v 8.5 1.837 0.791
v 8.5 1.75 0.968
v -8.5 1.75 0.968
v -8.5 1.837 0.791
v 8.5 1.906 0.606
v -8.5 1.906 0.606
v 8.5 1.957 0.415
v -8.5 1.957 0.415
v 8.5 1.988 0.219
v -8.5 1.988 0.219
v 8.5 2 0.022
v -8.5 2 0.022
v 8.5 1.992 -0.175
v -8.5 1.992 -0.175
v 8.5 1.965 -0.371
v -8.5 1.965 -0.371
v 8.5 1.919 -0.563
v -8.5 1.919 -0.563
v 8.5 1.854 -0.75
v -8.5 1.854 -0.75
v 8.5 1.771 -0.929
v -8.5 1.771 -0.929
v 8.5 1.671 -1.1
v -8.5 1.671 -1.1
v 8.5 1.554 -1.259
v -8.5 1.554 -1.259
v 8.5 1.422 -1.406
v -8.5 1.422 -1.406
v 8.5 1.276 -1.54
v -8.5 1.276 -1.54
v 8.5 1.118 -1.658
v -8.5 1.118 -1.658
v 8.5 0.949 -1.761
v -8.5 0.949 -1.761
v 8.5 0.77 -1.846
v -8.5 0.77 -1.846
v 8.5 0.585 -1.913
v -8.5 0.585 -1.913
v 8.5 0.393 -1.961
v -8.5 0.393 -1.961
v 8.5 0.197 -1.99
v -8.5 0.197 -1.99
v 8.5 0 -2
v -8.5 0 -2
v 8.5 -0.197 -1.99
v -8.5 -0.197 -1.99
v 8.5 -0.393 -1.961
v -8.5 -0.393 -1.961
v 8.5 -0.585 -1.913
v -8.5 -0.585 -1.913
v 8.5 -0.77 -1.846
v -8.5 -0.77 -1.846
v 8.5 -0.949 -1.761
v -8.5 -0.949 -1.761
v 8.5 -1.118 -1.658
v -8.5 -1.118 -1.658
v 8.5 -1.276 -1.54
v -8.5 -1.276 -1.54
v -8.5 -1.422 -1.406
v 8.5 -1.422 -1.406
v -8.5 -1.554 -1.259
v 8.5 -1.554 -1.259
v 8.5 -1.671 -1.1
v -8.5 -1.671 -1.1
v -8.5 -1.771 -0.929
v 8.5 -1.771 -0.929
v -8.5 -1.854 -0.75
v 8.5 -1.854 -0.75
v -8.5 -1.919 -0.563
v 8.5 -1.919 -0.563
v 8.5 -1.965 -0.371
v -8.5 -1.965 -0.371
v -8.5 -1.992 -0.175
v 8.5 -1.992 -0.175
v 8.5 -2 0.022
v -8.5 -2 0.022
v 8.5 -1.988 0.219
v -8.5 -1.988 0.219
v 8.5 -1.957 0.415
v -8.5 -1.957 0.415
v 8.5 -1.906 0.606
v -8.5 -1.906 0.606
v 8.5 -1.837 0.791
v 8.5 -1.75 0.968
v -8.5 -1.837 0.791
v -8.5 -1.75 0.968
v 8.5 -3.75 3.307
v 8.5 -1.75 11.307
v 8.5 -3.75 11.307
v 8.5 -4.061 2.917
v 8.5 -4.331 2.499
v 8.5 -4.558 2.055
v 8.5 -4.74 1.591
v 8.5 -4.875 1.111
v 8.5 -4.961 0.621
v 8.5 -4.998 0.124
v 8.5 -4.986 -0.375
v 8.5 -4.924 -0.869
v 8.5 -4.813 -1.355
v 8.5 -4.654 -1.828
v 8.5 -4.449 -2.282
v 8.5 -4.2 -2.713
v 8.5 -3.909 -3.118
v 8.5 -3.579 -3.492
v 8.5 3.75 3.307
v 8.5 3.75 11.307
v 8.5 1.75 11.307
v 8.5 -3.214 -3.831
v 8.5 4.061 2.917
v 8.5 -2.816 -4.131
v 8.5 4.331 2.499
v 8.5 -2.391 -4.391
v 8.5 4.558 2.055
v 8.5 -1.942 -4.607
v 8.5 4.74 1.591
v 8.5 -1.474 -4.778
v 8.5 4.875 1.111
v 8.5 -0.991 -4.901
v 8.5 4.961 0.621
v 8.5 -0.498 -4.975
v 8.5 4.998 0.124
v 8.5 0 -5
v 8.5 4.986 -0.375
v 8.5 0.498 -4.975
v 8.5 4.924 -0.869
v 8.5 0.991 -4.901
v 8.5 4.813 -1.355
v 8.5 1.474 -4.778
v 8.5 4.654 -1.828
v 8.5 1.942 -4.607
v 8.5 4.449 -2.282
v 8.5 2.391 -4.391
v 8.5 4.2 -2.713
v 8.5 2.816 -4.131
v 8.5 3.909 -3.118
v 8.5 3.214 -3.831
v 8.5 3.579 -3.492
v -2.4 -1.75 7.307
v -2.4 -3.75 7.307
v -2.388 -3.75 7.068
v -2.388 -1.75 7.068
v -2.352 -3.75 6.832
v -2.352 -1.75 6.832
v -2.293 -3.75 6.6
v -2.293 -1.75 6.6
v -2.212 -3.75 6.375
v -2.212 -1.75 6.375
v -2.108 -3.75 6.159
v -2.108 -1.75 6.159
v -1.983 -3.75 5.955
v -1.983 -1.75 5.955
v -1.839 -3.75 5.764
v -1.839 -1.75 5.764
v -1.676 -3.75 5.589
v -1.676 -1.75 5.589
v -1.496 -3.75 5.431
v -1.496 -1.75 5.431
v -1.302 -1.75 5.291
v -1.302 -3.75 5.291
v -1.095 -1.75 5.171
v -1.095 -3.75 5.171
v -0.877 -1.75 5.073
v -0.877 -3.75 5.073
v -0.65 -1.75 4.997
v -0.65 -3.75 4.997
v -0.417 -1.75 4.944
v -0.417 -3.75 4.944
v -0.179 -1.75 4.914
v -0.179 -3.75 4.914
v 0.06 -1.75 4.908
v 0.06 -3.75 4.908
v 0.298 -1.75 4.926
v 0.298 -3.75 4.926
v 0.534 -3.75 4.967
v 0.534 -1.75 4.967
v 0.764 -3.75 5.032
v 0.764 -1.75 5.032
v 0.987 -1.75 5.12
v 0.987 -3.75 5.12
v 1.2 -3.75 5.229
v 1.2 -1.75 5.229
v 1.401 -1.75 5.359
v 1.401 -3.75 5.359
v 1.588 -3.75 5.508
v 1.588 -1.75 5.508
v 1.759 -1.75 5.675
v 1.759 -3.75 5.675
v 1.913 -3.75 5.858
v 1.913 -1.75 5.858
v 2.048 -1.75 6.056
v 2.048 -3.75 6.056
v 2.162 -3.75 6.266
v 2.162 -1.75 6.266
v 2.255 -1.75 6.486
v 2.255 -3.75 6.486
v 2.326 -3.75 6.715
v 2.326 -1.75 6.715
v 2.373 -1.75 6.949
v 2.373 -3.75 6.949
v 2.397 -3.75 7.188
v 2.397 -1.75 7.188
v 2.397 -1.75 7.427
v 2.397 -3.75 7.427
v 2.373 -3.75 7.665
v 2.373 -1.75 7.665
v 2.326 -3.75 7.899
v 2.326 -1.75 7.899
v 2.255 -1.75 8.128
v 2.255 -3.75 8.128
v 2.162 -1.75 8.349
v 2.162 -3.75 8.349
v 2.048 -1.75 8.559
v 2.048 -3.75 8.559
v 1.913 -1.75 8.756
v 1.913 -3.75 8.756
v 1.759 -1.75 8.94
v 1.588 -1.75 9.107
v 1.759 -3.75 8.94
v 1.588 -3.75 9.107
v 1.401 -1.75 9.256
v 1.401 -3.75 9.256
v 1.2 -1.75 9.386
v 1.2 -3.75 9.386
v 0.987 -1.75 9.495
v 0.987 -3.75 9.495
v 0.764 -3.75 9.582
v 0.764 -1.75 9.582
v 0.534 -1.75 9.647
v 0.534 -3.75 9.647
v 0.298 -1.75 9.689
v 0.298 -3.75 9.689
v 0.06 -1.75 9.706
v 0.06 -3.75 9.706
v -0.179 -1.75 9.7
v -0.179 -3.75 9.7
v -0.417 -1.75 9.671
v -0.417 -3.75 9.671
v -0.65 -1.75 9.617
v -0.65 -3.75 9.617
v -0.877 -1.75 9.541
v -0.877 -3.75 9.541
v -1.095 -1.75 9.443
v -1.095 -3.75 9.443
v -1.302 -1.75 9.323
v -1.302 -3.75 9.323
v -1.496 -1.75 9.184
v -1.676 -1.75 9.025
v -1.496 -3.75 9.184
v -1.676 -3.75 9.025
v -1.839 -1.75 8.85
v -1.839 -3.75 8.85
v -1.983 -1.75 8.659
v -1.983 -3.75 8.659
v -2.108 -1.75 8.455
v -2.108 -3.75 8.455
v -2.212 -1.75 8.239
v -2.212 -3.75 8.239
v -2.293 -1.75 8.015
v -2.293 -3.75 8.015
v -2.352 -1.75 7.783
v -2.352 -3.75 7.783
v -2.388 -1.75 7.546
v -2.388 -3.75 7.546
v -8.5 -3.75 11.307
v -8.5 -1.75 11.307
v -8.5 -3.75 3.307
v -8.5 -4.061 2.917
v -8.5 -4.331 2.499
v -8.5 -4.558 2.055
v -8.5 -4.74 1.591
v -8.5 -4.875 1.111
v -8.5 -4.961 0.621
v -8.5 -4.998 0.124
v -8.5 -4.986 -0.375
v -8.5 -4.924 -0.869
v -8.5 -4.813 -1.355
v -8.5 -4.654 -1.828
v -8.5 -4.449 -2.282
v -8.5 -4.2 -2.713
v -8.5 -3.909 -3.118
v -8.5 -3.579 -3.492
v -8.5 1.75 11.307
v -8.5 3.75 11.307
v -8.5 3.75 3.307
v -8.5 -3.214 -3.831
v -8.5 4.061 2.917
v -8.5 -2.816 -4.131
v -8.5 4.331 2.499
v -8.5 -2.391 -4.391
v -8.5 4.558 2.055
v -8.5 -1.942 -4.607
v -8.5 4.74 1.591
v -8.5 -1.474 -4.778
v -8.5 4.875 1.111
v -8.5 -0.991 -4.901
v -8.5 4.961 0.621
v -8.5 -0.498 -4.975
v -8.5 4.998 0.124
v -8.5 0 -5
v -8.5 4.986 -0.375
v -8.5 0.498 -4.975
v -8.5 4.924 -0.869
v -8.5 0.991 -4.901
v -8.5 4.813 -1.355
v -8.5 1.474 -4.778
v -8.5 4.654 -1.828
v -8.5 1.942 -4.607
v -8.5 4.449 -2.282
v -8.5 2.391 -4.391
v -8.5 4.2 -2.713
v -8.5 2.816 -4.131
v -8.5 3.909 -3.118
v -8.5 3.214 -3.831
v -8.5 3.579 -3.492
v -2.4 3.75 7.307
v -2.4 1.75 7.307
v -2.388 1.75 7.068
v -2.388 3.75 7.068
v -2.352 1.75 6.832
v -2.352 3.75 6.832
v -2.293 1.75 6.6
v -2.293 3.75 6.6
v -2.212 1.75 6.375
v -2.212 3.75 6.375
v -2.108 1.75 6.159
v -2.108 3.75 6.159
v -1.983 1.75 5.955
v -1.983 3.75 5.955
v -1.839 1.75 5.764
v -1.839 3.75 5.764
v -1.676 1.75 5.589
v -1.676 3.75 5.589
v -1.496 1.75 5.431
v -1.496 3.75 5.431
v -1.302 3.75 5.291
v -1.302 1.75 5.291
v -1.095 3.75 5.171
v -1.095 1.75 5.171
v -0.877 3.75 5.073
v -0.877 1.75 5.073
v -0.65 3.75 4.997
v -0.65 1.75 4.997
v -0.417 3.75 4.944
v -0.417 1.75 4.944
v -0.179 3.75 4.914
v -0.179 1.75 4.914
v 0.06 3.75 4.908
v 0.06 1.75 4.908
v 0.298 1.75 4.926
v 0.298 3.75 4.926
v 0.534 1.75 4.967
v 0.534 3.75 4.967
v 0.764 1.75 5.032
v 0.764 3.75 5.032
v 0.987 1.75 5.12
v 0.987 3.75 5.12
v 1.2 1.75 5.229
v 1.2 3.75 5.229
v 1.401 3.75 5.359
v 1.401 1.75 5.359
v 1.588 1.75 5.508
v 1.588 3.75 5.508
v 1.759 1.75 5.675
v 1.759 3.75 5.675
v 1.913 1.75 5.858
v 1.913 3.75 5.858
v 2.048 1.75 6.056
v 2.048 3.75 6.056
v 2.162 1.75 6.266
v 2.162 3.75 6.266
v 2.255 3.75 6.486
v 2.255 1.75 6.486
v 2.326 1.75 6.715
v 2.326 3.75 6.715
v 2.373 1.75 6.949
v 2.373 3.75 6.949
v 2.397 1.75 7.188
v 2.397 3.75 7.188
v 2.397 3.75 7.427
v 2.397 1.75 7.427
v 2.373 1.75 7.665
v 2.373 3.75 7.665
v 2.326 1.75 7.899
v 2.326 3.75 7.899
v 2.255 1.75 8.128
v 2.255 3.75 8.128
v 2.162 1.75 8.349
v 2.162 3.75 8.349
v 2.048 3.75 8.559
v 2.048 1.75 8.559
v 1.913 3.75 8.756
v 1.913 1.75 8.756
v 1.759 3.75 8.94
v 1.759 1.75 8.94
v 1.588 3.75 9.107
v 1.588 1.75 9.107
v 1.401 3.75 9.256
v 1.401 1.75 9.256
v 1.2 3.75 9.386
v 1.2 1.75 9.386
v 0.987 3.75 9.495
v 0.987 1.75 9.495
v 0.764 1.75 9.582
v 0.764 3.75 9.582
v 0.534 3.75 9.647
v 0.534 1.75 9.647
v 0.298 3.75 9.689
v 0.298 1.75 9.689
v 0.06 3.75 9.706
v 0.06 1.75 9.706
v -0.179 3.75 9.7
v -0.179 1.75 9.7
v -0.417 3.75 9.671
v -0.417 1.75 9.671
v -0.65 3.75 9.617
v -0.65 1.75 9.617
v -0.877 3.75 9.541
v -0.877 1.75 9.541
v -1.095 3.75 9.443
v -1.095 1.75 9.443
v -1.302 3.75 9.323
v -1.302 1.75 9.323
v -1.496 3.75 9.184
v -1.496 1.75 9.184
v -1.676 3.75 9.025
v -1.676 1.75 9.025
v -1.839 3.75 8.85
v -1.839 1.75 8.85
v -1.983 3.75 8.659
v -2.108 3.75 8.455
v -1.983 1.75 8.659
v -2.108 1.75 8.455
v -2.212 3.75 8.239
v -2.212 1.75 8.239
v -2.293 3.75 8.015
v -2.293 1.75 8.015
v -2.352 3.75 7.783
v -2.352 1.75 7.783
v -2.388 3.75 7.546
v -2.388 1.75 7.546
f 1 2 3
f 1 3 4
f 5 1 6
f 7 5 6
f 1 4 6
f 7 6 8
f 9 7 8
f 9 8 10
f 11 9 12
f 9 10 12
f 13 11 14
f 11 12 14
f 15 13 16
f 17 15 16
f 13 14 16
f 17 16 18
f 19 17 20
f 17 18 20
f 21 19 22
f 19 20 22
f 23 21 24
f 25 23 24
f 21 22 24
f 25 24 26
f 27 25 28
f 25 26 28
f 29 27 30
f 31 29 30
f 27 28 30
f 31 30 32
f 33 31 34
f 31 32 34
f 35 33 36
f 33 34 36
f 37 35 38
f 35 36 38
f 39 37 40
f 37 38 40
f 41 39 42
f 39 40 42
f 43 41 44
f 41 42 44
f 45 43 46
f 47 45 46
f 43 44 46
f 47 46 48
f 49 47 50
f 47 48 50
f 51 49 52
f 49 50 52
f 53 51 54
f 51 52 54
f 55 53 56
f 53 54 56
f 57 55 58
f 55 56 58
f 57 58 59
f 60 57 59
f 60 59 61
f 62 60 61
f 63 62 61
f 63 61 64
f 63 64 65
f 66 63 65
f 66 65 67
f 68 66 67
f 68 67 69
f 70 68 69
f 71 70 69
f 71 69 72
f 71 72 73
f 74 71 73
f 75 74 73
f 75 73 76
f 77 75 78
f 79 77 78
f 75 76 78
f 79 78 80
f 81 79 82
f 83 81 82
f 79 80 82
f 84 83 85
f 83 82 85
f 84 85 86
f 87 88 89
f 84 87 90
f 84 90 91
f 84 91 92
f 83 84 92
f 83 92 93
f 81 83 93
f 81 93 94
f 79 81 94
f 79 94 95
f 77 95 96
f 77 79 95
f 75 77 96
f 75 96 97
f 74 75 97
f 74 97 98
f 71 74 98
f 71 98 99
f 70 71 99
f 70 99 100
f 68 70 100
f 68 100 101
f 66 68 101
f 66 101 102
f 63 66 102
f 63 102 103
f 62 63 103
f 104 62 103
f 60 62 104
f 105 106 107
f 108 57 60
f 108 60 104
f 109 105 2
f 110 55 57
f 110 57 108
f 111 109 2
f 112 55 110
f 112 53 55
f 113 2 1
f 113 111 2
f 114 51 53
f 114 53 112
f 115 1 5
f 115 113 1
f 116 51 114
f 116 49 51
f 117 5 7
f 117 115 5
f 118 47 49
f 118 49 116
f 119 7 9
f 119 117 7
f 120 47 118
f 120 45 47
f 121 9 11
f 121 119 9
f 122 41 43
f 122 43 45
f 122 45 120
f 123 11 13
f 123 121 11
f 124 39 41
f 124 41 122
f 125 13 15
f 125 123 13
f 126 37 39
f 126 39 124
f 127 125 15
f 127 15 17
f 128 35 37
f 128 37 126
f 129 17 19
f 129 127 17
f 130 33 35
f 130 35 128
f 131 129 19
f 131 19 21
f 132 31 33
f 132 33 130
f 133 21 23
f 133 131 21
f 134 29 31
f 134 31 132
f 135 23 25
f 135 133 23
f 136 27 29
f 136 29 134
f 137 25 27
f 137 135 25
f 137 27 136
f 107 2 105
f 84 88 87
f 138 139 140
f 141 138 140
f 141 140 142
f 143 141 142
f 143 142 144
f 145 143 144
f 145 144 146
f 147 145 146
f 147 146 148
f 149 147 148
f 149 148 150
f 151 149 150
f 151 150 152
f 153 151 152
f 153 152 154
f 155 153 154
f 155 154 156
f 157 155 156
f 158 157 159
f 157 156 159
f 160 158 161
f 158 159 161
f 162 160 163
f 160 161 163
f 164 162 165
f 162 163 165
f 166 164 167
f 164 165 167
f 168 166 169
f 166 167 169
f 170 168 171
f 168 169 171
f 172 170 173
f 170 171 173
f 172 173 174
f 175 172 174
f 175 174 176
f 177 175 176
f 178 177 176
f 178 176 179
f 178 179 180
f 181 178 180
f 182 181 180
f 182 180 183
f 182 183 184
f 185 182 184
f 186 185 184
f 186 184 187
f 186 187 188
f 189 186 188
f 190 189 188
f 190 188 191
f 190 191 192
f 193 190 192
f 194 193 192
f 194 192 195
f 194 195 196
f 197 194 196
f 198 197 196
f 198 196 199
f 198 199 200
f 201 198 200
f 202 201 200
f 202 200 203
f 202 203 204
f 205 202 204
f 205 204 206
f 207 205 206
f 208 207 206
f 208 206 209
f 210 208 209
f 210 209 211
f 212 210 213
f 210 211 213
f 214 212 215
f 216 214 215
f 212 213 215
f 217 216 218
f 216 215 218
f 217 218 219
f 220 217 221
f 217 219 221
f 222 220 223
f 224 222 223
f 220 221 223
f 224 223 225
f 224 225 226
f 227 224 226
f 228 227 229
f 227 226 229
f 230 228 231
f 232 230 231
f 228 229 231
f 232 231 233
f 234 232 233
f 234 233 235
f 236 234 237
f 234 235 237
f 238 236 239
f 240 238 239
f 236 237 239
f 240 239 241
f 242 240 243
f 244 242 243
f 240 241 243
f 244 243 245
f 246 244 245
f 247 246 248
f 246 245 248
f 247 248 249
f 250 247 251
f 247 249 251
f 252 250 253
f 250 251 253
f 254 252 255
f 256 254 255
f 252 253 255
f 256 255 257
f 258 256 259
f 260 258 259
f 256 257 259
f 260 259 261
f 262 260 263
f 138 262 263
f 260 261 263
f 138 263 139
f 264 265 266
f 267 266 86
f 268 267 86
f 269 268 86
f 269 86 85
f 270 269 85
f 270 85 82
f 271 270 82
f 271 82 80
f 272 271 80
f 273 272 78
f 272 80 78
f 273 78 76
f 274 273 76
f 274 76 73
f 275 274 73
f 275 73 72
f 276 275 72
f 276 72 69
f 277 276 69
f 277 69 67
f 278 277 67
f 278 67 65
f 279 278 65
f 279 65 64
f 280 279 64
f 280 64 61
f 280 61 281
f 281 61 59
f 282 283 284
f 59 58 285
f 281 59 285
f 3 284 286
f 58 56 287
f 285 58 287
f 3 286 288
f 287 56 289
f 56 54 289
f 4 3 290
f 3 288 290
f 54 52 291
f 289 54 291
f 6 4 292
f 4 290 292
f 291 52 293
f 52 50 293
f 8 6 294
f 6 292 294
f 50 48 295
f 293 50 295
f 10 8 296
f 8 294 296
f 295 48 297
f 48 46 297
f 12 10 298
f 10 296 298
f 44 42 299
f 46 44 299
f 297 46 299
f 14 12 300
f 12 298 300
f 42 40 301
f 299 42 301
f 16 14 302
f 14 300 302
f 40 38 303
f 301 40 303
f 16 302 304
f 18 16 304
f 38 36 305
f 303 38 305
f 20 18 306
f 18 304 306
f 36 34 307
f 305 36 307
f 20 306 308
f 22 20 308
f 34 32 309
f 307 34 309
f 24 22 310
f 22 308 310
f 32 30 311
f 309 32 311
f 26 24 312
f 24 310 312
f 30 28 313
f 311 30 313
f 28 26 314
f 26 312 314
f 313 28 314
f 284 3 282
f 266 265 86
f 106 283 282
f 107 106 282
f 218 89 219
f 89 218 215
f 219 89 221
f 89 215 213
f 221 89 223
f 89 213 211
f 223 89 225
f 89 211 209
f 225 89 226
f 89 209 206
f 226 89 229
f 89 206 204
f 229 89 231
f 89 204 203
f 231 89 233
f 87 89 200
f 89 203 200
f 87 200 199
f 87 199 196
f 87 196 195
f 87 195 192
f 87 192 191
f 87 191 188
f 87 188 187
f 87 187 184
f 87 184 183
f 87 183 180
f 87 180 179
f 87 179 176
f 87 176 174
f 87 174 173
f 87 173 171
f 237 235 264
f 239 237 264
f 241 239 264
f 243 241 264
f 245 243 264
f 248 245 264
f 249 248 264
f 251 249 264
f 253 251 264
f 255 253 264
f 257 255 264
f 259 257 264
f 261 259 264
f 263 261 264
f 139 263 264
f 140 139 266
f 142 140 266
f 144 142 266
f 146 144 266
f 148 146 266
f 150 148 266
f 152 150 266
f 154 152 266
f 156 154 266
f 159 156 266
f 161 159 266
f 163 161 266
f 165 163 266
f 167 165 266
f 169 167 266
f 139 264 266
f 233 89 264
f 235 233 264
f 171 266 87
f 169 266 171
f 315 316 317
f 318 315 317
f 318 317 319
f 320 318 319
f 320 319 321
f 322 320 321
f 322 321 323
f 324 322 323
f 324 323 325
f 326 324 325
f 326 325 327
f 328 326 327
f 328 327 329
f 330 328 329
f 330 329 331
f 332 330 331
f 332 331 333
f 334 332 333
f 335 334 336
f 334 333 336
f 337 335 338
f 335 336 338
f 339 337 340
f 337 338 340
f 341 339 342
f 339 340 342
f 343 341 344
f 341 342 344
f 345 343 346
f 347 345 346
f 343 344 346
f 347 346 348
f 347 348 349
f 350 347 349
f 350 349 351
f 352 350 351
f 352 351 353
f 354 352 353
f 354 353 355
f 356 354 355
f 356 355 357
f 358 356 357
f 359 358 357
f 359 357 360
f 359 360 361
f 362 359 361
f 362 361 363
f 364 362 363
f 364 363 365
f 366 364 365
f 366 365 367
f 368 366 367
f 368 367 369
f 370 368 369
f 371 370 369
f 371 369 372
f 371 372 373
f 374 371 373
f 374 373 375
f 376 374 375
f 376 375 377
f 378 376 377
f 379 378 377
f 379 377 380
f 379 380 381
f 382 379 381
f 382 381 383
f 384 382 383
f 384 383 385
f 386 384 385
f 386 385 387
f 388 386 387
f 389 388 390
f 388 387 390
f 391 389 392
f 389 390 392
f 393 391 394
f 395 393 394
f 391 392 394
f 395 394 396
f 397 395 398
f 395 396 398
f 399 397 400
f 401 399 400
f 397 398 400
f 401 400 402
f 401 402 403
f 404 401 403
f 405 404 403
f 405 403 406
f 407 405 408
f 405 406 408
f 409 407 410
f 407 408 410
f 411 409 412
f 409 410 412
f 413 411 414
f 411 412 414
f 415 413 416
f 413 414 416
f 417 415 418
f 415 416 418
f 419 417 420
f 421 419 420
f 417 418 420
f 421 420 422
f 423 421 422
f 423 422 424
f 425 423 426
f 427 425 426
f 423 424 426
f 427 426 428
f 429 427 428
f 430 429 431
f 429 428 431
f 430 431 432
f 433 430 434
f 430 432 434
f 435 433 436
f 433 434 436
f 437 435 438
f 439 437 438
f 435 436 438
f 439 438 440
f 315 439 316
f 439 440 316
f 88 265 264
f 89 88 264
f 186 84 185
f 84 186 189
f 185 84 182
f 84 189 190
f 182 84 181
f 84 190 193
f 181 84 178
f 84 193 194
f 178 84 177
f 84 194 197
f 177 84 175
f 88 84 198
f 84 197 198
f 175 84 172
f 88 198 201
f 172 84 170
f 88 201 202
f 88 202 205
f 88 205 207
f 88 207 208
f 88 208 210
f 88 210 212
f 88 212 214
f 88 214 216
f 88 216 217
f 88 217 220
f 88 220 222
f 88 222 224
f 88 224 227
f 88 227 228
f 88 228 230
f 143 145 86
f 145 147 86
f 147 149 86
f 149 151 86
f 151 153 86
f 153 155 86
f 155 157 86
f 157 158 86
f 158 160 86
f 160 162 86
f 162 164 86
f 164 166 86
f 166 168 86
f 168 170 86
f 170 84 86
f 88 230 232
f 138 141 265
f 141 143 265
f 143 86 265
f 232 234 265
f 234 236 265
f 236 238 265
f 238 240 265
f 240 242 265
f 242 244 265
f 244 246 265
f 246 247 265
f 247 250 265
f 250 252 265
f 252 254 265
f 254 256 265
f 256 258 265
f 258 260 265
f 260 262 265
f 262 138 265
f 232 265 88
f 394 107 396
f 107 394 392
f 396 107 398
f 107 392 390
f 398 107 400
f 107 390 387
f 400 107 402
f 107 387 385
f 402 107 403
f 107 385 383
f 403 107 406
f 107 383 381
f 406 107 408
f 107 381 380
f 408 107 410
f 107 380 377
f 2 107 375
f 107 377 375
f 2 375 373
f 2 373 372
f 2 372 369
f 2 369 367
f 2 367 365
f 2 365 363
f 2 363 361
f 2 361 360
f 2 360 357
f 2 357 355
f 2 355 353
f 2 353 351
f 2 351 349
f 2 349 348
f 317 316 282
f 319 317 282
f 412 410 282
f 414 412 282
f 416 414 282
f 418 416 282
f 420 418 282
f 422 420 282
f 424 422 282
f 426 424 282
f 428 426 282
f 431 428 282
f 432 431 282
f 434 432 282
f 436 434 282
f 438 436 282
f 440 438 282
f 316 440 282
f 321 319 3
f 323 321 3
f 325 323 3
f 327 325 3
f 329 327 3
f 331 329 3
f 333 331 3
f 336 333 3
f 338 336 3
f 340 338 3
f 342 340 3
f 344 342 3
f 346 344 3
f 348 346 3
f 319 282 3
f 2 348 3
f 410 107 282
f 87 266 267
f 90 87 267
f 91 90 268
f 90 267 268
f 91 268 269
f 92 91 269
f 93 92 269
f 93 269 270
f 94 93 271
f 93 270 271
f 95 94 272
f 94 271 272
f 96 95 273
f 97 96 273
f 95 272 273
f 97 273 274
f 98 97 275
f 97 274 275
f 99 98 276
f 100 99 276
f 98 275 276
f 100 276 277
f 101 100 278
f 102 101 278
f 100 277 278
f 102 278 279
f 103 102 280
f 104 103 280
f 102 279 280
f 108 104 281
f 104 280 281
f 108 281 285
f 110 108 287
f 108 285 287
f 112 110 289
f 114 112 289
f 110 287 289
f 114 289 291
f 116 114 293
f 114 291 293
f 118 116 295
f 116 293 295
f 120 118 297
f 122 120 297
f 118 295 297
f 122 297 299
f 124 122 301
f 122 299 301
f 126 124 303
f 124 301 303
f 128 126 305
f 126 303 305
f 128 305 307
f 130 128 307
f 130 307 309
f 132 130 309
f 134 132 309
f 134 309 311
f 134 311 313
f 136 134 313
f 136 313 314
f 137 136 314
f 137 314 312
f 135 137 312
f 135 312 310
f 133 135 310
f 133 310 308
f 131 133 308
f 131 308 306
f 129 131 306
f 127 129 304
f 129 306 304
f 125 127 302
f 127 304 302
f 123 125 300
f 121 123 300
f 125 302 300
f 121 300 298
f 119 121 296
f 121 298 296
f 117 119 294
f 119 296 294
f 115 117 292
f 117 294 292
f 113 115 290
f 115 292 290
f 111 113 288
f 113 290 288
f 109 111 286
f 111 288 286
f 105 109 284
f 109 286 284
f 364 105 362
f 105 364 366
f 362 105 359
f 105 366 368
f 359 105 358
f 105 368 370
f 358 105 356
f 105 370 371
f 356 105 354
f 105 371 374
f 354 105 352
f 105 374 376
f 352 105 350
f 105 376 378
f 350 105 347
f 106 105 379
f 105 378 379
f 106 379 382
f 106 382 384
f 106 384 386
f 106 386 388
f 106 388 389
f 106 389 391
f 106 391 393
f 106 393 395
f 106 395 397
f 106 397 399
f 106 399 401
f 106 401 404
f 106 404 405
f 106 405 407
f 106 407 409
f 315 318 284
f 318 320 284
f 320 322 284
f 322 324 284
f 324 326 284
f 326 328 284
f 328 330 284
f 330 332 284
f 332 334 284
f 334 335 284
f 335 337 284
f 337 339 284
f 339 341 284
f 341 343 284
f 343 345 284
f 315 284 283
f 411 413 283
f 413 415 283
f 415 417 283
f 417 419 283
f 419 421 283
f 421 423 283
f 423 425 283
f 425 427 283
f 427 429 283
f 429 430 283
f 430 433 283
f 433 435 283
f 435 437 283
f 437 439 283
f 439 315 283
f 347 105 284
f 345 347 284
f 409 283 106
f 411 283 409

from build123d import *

# Parameters (mm, degrees)
BOSS_EXTRU_1_DEPTH      = 8.5
BOSS_EXTRU_1_DEPTH_BACK = 8.5
D_GAGEMENT_M41_D        = 4.8


with BuildPart() as part:
    # Esquisse1 → Boss.-Extru.1 (new, two sides: drawn at the far end of the back side and taken through both)
    with BuildSketch(Plane(origin=(0, 0, 0), x_dir=(0, 0, -1), z_dir=(1, 0, 0)).offset(-BOSS_EXTRU_1_DEPTH_BACK)):
        with BuildLine():
            Line((-3.307189139, 3.75), (-11.307189139, 3.75))
            Line((-11.307189139, 3.75), (-11.307189139, 1.75))
            Line((-11.307189139, 1.75), (-0.968245837, 1.75))
            ThreePointArc((-0.968245837, 1.75), (2, 0), (-0.968245837, -1.75))
            Line((-0.968245837, -1.75), (-11.307189139, -1.75))
            Line((-11.307189139, -1.75), (-11.307189139, -3.75))
            Line((-11.307189139, -3.75), (-3.307189139, -3.75))
            ThreePointArc((-3.307189139, -3.75), (5, 0), (-3.307189139, 3.75))
        make_face()
    extrude(amount=BOSS_EXTRU_1_DEPTH + BOSS_EXTRU_1_DEPTH_BACK)

    # Dégagement M41 (through all)
    with Locations(Plane(origin=(0, 3.75, 0), x_dir=(1, 0, 0), z_dir=(0, 1, 0))):
        with Locations((0, -7.307189139)):
            Hole(D_GAGEMENT_M41_D / 2)


solid = part.part
